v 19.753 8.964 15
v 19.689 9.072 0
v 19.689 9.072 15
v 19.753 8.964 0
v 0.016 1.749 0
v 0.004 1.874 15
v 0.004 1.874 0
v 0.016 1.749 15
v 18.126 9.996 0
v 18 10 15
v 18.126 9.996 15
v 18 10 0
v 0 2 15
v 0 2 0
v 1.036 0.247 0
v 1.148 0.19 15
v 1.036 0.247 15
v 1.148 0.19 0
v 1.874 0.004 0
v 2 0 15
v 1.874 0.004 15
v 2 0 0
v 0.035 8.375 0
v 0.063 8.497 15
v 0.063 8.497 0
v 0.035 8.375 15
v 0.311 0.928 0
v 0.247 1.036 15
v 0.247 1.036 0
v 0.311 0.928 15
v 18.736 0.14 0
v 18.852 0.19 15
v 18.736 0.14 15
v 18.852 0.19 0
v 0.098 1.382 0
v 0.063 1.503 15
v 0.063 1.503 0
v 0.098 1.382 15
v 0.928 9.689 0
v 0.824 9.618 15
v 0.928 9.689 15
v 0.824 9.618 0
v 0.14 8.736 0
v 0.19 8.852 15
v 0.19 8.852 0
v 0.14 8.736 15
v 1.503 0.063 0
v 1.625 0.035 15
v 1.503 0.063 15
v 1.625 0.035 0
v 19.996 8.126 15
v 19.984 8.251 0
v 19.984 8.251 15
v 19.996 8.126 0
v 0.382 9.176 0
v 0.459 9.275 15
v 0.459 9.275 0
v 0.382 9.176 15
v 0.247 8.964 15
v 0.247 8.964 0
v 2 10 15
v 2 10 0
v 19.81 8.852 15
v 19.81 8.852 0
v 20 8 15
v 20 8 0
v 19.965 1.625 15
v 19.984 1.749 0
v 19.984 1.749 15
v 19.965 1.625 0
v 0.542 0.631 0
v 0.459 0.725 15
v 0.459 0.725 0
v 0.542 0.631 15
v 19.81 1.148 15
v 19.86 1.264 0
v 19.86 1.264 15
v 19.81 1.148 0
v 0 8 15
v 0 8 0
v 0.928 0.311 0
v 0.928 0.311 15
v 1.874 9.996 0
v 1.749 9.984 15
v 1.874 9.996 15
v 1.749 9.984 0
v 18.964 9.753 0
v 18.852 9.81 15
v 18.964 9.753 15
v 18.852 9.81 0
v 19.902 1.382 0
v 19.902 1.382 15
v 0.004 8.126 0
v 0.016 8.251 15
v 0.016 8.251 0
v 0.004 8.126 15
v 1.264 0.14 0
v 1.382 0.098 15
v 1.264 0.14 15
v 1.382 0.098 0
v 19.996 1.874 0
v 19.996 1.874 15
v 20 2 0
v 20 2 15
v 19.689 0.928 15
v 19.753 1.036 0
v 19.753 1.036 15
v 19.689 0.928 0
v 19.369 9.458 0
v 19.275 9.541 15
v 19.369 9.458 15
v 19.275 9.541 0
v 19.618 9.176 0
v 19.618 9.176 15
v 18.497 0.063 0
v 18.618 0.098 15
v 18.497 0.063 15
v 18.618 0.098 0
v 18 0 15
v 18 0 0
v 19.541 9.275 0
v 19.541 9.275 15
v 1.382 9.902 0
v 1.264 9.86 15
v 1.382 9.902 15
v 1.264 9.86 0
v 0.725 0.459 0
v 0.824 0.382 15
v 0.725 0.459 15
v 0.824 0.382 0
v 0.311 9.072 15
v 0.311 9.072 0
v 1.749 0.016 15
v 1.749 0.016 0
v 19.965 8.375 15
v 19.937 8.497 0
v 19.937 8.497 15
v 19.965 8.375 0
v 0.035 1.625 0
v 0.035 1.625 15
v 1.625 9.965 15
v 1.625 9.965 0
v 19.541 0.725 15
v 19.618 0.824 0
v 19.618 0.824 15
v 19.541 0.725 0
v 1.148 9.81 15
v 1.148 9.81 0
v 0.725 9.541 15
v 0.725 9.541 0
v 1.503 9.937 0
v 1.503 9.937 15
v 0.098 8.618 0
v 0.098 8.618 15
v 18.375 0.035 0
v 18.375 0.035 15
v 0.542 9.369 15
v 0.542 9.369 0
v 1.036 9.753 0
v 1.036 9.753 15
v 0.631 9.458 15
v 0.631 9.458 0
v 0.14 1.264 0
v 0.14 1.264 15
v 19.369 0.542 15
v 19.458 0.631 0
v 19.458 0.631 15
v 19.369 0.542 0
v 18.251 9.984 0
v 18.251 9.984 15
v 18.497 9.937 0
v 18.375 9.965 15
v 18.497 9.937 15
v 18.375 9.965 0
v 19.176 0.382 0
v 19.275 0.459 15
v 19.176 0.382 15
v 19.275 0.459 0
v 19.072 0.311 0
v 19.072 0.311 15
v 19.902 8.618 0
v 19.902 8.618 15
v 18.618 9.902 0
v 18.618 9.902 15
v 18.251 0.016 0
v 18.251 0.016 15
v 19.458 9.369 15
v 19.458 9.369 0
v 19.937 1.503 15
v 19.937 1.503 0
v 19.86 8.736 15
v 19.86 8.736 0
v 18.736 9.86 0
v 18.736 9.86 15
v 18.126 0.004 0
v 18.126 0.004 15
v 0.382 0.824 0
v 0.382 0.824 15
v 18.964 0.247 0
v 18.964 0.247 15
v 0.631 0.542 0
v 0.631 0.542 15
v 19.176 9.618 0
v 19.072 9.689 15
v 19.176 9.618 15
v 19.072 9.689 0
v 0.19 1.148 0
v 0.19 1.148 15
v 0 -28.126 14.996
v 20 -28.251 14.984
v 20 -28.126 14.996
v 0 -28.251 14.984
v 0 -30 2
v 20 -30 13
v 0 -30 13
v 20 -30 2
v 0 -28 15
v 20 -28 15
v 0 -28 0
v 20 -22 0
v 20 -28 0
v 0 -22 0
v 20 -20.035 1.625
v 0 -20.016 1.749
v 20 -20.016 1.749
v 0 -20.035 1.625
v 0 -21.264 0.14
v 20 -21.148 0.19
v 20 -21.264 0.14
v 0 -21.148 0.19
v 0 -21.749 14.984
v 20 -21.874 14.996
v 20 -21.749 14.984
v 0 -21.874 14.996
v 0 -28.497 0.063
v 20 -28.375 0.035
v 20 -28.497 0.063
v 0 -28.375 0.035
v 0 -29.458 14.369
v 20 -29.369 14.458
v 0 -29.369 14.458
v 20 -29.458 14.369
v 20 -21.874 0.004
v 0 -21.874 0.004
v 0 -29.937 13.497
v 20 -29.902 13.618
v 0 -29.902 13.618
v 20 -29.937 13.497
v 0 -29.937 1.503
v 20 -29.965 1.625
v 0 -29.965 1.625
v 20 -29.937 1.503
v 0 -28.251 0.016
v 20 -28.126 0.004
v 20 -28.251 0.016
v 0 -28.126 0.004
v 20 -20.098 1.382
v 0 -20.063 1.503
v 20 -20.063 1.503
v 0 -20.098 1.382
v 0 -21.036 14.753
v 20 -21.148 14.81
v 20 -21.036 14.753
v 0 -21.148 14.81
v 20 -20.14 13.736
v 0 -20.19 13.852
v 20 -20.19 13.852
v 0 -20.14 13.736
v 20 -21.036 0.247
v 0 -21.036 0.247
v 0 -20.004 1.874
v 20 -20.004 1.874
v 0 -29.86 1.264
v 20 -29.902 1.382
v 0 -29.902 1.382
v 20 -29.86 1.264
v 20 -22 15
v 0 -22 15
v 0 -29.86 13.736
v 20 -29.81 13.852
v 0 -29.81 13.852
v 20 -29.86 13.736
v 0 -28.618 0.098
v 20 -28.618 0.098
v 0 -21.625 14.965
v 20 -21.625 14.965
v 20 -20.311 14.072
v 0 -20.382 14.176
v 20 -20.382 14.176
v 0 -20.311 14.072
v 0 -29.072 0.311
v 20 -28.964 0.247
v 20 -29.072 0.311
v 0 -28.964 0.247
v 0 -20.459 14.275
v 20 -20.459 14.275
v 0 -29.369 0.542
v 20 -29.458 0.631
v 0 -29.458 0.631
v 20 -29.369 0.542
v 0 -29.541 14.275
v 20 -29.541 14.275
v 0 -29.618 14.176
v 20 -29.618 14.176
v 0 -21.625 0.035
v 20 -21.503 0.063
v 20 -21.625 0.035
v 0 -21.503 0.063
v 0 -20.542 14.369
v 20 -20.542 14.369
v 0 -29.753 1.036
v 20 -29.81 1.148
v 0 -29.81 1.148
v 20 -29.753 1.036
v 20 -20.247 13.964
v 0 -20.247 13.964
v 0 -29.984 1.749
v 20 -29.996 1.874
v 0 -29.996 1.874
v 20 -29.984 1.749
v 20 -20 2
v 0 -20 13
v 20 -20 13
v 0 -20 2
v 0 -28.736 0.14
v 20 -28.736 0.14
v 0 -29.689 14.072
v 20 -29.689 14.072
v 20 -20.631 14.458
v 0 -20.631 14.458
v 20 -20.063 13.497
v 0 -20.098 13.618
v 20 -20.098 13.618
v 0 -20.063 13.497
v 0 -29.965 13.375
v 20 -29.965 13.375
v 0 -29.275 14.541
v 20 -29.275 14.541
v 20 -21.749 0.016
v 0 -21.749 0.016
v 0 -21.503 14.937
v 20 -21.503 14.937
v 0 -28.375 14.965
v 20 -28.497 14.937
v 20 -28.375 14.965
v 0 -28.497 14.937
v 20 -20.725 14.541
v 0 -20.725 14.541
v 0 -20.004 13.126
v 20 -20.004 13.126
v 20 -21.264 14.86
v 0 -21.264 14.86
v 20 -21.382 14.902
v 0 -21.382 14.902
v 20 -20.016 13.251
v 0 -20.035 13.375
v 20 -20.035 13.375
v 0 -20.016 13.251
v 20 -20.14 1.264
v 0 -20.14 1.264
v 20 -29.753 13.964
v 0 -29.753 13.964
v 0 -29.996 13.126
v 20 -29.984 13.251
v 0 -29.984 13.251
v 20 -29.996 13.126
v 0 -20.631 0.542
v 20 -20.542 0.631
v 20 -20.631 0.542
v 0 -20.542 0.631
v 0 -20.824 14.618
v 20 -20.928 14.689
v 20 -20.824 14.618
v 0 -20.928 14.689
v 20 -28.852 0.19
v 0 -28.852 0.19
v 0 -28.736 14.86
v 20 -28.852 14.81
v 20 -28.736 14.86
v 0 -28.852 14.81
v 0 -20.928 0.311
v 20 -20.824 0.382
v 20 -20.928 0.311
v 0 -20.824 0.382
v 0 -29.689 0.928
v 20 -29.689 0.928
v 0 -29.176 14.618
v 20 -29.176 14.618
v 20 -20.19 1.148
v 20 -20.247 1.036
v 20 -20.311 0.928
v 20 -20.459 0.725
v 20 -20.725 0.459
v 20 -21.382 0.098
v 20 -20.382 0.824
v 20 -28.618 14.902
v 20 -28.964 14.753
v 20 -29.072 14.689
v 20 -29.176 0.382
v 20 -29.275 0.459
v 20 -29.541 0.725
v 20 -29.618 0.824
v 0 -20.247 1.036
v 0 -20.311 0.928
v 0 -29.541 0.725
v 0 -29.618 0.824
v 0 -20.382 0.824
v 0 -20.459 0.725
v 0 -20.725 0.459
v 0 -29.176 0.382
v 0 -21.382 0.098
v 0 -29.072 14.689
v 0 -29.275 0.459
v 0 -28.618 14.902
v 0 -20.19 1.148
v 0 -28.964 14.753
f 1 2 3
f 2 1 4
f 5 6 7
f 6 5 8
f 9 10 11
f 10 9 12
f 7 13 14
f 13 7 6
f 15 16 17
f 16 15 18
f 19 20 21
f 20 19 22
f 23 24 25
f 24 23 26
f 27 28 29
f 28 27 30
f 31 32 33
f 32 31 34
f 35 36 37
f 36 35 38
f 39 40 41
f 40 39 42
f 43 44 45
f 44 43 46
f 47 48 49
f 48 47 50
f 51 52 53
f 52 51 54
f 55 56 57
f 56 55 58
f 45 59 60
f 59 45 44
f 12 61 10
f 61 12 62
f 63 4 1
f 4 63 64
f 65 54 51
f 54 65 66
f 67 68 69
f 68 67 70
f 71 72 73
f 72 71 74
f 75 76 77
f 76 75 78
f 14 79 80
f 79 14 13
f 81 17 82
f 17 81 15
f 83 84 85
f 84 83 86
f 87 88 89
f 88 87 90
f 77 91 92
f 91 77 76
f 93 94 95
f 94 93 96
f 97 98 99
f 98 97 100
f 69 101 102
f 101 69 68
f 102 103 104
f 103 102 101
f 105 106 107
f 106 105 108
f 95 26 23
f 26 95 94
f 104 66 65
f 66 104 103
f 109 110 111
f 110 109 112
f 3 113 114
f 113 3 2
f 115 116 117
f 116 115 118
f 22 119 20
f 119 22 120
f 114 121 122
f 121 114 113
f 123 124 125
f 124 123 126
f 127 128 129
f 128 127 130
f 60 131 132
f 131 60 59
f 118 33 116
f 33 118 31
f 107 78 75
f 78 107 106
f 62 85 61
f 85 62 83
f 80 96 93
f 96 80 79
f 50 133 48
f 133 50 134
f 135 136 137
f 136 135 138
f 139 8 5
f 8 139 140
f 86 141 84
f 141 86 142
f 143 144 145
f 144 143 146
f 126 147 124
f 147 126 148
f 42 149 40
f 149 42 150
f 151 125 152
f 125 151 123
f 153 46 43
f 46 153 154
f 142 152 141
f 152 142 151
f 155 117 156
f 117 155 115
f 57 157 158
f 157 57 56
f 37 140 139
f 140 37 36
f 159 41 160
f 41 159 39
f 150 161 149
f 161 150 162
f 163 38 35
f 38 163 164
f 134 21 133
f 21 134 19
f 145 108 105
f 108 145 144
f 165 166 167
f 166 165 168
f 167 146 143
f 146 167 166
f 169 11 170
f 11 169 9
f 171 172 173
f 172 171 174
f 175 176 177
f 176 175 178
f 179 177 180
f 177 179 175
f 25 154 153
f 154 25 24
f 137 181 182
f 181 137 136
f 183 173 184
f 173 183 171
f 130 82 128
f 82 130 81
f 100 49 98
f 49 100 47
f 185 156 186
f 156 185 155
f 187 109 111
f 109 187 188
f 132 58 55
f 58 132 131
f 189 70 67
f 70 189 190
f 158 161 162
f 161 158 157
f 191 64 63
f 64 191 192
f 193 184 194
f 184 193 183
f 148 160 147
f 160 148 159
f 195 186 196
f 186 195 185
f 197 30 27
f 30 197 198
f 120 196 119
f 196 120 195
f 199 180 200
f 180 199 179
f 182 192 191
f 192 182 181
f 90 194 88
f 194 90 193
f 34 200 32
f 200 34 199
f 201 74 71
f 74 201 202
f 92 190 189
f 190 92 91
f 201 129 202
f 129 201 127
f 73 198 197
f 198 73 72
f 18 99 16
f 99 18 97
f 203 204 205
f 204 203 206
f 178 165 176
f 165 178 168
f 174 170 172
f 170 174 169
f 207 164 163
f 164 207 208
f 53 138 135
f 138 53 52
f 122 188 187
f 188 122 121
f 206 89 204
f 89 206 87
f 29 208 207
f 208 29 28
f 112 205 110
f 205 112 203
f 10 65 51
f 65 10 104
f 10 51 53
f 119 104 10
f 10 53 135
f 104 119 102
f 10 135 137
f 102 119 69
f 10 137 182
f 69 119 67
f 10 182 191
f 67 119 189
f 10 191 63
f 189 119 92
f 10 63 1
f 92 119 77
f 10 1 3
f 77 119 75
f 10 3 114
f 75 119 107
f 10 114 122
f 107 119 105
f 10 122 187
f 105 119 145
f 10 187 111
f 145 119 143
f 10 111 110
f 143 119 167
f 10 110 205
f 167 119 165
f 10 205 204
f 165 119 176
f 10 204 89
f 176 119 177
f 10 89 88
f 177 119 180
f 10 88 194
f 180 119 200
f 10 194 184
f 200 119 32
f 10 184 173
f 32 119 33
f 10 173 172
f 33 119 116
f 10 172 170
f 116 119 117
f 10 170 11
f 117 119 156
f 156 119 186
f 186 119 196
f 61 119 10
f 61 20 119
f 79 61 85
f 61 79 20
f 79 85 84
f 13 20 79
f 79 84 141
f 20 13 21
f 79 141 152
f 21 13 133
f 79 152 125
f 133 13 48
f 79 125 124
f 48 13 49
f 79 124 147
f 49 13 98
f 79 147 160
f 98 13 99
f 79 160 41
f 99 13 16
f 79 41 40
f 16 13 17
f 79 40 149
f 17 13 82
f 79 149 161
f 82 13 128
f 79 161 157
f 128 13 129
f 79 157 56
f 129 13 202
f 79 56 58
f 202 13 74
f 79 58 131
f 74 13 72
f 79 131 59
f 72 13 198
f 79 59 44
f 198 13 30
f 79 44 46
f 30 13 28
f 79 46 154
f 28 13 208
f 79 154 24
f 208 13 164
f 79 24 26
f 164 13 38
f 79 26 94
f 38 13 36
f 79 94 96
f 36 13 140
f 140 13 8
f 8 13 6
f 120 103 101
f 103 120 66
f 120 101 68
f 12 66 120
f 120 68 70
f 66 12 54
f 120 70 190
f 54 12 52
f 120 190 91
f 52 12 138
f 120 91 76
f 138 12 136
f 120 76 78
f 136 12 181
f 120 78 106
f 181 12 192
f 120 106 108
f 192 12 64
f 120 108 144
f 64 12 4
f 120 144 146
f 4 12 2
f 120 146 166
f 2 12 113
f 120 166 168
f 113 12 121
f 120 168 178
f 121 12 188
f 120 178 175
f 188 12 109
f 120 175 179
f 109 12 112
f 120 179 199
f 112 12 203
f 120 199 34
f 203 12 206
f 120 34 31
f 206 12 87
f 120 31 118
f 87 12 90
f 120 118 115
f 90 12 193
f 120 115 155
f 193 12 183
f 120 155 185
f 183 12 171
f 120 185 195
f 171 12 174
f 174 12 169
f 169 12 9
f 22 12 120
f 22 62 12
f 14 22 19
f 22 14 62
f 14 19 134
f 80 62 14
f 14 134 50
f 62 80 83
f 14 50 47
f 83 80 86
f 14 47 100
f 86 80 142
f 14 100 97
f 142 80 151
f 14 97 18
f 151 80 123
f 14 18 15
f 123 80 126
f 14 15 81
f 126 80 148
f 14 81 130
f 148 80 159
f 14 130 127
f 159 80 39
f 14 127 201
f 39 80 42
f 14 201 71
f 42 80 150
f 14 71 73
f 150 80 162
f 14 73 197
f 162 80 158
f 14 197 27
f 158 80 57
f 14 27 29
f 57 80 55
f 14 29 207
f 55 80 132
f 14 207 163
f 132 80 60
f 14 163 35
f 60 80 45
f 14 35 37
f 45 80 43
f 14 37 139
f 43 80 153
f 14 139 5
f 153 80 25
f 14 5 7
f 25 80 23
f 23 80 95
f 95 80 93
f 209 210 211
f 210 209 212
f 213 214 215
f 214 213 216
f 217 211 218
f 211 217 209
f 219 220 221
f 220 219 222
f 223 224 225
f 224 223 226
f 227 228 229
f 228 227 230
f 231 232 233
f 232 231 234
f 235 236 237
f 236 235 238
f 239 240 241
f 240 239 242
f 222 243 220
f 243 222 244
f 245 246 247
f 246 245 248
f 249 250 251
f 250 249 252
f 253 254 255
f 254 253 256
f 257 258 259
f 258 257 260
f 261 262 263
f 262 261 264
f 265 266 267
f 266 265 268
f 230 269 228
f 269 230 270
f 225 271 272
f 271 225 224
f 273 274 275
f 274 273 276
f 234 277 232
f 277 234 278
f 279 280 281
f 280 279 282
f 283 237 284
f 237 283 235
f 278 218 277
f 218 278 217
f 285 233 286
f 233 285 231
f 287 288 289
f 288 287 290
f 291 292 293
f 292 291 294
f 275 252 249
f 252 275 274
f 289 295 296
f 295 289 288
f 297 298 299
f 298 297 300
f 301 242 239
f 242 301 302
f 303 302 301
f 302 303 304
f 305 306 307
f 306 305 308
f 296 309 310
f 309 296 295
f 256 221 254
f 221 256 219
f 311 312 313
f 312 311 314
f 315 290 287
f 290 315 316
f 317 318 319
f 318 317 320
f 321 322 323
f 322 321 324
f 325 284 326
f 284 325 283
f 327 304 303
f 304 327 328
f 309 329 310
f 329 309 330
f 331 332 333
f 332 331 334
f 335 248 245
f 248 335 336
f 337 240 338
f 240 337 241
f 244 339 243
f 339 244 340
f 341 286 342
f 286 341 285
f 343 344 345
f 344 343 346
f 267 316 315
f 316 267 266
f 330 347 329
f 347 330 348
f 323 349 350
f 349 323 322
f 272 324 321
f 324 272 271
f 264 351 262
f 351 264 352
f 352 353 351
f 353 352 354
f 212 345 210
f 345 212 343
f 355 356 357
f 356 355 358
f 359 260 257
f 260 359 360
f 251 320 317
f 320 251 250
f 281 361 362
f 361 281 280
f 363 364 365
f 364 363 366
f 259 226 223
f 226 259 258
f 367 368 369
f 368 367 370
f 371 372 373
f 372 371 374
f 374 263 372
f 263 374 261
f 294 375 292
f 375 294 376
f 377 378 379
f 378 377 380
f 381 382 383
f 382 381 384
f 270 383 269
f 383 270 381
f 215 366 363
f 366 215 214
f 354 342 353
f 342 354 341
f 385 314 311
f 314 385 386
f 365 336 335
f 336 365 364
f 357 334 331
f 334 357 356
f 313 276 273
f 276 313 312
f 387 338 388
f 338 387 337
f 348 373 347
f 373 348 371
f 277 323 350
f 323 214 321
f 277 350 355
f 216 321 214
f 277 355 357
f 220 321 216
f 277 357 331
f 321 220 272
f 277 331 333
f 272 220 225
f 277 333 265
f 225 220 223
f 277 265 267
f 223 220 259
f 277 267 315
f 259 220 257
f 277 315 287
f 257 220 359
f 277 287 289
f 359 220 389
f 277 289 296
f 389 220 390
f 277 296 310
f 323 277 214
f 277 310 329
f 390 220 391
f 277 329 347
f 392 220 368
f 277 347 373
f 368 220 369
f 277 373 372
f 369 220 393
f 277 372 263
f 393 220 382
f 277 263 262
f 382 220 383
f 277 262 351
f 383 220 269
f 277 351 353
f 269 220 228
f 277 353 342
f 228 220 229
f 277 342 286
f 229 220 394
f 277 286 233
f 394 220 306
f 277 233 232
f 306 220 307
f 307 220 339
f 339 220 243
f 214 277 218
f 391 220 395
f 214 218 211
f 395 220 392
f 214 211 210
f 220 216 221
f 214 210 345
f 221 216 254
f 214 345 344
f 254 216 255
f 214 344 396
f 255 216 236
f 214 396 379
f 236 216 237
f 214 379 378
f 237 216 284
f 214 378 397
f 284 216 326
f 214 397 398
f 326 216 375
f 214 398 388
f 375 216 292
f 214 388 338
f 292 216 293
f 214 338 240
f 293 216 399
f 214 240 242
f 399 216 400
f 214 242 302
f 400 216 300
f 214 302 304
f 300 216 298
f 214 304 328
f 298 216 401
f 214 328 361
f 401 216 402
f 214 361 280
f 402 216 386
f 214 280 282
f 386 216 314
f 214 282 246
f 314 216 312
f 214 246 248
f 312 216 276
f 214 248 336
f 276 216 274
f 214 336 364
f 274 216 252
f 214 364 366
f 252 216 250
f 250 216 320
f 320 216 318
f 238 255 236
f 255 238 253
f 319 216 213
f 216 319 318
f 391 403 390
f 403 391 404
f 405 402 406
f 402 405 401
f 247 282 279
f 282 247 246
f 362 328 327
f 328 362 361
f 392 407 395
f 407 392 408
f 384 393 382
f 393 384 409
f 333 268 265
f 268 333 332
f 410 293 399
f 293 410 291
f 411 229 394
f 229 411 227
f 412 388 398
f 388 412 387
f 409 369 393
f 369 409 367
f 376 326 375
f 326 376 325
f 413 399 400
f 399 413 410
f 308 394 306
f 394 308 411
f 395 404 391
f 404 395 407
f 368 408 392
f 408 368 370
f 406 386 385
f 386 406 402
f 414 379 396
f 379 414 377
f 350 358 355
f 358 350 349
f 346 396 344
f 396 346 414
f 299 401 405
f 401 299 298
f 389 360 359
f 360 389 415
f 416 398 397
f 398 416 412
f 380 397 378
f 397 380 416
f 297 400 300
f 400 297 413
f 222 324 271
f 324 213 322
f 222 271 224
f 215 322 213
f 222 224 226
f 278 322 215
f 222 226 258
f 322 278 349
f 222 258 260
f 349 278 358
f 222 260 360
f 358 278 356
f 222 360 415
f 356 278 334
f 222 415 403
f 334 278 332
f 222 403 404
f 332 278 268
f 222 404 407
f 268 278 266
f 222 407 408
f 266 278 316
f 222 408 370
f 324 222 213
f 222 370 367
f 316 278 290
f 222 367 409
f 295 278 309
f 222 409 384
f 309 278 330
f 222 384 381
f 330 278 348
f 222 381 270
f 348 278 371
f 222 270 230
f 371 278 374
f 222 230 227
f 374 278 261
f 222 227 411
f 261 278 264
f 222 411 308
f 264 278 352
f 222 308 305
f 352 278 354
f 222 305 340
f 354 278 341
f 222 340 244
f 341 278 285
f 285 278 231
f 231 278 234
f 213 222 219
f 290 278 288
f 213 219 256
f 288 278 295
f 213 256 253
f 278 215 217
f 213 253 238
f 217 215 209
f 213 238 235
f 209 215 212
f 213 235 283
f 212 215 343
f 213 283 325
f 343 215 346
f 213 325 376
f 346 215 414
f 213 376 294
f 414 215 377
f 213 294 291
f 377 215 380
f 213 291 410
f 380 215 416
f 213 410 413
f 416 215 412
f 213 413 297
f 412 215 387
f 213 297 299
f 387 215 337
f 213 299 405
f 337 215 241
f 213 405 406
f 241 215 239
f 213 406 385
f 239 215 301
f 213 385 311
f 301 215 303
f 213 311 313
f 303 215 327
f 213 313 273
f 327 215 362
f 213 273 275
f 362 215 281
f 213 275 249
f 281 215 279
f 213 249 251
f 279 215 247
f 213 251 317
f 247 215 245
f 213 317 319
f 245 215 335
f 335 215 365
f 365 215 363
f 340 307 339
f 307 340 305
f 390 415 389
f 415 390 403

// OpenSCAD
$fn = 100;
width = 20;
depth = 10;
height = 15;
bevel = 2;

//linear_extrude(height=10)
round_cube_xy(width, depth, height, bevel);
translate([0,-30,0])
round_cube_yz(width, depth, height, bevel);


module round_cube_xy(w, d, h, b) {
	linear_extrude(h)
	hull(){
	translate([0 + b, b, 0]) circle(b);
	translate([w - b, b, 0]) circle(b);
	translate([w - b, d - b, 0]) circle(b);
	translate([0 + b, d- b, 0]) circle(b);
	}
}

module round_cube_yz(w, d, h, b) {
	translate([0,0,h])
	rotate([0,90,0])
	linear_extrude(w)
	hull(){
	translate([0 + b, b, 0]) circle(b);
	translate([h - b, b, 0]) circle(b);
	translate([h - b, d - b, 0]) circle(b);
	translate([0 + b, d- b, 0]) circle(b);
	}
}
